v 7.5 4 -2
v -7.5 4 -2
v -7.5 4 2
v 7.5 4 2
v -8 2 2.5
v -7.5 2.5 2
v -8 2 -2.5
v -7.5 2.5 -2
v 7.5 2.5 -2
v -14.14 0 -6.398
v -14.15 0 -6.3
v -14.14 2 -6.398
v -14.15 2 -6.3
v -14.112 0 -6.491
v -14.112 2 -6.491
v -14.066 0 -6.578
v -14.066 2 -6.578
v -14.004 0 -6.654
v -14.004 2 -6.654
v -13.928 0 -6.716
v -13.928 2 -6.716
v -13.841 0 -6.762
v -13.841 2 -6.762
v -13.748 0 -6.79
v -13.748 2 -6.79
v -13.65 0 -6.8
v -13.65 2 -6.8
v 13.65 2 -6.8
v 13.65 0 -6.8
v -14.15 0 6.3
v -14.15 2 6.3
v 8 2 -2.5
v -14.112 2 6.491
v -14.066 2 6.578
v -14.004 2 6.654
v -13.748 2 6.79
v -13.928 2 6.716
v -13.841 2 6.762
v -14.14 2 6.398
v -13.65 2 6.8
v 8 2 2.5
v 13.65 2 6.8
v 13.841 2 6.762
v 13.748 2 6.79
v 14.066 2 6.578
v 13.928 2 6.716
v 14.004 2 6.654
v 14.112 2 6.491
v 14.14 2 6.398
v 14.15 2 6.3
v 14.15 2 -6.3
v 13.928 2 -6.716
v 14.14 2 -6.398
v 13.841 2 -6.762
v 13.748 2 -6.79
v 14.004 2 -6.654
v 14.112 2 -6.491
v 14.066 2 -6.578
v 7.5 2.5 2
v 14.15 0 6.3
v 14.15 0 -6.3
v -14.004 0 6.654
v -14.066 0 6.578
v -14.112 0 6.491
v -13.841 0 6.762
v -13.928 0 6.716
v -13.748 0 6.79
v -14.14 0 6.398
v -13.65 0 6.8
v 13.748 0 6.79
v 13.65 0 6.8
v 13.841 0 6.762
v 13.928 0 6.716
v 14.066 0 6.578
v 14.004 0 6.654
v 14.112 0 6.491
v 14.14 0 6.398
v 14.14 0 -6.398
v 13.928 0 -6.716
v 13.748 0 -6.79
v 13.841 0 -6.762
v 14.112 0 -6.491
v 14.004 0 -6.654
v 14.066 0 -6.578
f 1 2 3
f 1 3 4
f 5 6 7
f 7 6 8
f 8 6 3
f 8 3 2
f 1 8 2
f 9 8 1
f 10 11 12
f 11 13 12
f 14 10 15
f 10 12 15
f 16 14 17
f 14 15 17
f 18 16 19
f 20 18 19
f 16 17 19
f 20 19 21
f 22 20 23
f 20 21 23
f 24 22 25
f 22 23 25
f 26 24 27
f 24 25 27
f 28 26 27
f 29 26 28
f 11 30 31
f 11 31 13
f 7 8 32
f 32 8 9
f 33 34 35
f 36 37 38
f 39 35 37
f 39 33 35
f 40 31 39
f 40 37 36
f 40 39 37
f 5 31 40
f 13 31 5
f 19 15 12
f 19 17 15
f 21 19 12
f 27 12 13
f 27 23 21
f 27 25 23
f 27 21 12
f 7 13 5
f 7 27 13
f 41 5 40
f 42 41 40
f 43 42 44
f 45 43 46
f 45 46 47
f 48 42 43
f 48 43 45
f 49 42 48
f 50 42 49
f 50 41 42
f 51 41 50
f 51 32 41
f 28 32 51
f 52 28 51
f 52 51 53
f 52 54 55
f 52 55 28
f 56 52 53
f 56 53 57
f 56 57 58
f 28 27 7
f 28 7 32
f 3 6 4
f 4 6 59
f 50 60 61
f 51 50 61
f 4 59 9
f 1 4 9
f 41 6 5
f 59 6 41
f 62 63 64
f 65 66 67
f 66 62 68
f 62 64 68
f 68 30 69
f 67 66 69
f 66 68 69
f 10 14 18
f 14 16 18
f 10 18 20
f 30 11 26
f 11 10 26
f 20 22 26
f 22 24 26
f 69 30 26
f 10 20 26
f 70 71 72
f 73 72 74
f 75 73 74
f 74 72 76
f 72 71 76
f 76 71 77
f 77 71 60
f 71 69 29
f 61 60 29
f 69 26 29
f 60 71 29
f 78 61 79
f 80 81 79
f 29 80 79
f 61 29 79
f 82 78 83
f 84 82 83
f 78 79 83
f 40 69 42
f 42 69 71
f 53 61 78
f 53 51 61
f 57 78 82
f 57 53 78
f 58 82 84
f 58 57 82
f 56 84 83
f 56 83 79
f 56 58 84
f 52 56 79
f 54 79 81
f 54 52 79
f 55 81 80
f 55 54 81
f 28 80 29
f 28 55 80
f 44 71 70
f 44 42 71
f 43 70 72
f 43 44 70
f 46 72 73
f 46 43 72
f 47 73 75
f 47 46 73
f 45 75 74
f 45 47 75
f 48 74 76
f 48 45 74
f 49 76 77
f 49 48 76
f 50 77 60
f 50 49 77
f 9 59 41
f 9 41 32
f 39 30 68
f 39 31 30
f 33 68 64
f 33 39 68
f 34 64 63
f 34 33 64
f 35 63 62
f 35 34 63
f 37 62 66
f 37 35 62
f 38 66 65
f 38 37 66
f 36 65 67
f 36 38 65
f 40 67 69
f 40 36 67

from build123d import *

# Parameters (mm, degrees)
SKETCH1_W           = 28.3
SKETCH1_H           = 13.6
BOSS_EXTRUDE1_DEPTH = 2
FILLET1_R           = 0.5
SKETCH2_W           = 15
SKETCH2_H           = 4
BOSS_EXTRUDE2_DEPTH = 2
CHAMFER1_SIZE       = 0.5


with BuildPart() as part:
    # Sketch1 → Boss-Extrude1 (new body)
    with BuildSketch(Plane(origin=(0, 0, 0), x_dir=(1, 0, 0), z_dir=(0, 1, 0))):
        Rectangle(SKETCH1_W, SKETCH1_H)
    extrude(amount=BOSS_EXTRUDE1_DEPTH)

    # Fillet1
    fillet1_edges = [part.edges().sort_by_distance(p)[0] for p in [
        (-14.15, 1, 6.8),
        (14.15, 1, 6.8),
        (14.15, 1, -6.8),
        (-14.15, 1, -6.8),
    ]]
    fillet(fillet1_edges, radius=FILLET1_R)

    # Sketch2 → Boss-Extrude2 (add)
    with BuildSketch(Plane(origin=(0, 2, 0), x_dir=(1, 0, 0), z_dir=(0, 1, 0))):
        Rectangle(SKETCH2_W, SKETCH2_H)
    extrude(amount=BOSS_EXTRUDE2_DEPTH)

    # Chamfer1
    chamfer1_edges = [part.edges().sort_by_distance(p)[0] for p in [
        (7.5, 2, 0),
        (0, 2, -2),
        (-7.5, 2, 0),
        (0, 2, 2),
    ]]
    chamfer(chamfer1_edges, length=CHAMFER1_SIZE)


solid = part.part
